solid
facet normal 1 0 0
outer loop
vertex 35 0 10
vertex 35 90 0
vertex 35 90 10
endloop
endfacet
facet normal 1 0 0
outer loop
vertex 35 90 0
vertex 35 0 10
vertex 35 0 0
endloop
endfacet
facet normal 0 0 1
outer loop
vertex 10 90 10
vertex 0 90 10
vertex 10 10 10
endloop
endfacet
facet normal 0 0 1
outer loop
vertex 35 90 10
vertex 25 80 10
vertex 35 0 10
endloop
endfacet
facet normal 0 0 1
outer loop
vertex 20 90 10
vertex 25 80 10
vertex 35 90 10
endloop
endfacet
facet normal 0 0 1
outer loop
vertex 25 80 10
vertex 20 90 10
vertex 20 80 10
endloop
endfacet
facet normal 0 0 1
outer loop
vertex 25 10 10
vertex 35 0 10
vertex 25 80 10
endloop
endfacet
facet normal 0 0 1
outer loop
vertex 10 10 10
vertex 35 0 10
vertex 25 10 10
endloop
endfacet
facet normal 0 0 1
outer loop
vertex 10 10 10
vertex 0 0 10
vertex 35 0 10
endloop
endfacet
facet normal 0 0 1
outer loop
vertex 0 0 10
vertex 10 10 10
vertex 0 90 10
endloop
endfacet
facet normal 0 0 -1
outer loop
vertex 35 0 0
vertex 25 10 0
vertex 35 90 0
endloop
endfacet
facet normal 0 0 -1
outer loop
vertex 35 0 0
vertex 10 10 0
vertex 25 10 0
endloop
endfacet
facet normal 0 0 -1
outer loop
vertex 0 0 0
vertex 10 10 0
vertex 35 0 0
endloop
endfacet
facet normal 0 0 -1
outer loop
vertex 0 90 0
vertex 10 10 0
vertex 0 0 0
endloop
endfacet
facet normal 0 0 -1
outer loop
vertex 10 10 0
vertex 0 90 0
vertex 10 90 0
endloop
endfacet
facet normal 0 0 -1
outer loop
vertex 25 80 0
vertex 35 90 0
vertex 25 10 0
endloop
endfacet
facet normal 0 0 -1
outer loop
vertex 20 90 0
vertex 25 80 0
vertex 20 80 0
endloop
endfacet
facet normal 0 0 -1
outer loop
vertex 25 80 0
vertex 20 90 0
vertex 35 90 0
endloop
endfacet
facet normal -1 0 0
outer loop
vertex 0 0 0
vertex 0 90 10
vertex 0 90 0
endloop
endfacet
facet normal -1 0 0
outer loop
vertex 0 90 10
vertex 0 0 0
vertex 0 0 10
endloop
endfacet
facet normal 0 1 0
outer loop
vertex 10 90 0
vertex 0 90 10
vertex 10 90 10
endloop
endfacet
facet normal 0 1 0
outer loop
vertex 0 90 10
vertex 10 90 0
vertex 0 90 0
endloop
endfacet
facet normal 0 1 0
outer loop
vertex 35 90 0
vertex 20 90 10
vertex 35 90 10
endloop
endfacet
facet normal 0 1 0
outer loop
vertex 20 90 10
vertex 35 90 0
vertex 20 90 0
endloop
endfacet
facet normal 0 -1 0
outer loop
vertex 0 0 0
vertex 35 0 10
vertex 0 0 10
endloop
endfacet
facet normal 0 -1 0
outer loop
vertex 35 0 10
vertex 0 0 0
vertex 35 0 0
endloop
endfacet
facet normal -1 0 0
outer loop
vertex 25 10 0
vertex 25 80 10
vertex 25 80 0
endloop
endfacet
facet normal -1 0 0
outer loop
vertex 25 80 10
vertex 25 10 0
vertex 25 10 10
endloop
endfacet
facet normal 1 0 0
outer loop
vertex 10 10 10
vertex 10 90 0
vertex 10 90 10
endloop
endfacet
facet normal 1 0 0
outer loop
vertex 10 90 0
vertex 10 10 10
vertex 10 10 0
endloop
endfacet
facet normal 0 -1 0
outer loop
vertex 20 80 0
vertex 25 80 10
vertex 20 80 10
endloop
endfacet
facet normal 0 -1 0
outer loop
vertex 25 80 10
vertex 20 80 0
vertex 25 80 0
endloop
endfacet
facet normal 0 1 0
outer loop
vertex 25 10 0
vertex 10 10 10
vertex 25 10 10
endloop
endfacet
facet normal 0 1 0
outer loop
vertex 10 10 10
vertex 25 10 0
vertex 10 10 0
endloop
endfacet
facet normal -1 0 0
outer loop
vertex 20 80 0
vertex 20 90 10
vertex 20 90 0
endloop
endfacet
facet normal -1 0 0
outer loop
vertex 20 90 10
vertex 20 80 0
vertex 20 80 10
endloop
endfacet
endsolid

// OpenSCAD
thickness = 10;
gap = 15;
length = 90;
lip_length = 5;

difference(){
  cube([gap + thickness * 2, length, thickness]);

  translate([thickness, thickness, 0])
  cube([gap, length - 2 * thickness, thickness]);

  translate([thickness, thickness, 0])
  cube([gap - lip_length, length, thickness]);

}
